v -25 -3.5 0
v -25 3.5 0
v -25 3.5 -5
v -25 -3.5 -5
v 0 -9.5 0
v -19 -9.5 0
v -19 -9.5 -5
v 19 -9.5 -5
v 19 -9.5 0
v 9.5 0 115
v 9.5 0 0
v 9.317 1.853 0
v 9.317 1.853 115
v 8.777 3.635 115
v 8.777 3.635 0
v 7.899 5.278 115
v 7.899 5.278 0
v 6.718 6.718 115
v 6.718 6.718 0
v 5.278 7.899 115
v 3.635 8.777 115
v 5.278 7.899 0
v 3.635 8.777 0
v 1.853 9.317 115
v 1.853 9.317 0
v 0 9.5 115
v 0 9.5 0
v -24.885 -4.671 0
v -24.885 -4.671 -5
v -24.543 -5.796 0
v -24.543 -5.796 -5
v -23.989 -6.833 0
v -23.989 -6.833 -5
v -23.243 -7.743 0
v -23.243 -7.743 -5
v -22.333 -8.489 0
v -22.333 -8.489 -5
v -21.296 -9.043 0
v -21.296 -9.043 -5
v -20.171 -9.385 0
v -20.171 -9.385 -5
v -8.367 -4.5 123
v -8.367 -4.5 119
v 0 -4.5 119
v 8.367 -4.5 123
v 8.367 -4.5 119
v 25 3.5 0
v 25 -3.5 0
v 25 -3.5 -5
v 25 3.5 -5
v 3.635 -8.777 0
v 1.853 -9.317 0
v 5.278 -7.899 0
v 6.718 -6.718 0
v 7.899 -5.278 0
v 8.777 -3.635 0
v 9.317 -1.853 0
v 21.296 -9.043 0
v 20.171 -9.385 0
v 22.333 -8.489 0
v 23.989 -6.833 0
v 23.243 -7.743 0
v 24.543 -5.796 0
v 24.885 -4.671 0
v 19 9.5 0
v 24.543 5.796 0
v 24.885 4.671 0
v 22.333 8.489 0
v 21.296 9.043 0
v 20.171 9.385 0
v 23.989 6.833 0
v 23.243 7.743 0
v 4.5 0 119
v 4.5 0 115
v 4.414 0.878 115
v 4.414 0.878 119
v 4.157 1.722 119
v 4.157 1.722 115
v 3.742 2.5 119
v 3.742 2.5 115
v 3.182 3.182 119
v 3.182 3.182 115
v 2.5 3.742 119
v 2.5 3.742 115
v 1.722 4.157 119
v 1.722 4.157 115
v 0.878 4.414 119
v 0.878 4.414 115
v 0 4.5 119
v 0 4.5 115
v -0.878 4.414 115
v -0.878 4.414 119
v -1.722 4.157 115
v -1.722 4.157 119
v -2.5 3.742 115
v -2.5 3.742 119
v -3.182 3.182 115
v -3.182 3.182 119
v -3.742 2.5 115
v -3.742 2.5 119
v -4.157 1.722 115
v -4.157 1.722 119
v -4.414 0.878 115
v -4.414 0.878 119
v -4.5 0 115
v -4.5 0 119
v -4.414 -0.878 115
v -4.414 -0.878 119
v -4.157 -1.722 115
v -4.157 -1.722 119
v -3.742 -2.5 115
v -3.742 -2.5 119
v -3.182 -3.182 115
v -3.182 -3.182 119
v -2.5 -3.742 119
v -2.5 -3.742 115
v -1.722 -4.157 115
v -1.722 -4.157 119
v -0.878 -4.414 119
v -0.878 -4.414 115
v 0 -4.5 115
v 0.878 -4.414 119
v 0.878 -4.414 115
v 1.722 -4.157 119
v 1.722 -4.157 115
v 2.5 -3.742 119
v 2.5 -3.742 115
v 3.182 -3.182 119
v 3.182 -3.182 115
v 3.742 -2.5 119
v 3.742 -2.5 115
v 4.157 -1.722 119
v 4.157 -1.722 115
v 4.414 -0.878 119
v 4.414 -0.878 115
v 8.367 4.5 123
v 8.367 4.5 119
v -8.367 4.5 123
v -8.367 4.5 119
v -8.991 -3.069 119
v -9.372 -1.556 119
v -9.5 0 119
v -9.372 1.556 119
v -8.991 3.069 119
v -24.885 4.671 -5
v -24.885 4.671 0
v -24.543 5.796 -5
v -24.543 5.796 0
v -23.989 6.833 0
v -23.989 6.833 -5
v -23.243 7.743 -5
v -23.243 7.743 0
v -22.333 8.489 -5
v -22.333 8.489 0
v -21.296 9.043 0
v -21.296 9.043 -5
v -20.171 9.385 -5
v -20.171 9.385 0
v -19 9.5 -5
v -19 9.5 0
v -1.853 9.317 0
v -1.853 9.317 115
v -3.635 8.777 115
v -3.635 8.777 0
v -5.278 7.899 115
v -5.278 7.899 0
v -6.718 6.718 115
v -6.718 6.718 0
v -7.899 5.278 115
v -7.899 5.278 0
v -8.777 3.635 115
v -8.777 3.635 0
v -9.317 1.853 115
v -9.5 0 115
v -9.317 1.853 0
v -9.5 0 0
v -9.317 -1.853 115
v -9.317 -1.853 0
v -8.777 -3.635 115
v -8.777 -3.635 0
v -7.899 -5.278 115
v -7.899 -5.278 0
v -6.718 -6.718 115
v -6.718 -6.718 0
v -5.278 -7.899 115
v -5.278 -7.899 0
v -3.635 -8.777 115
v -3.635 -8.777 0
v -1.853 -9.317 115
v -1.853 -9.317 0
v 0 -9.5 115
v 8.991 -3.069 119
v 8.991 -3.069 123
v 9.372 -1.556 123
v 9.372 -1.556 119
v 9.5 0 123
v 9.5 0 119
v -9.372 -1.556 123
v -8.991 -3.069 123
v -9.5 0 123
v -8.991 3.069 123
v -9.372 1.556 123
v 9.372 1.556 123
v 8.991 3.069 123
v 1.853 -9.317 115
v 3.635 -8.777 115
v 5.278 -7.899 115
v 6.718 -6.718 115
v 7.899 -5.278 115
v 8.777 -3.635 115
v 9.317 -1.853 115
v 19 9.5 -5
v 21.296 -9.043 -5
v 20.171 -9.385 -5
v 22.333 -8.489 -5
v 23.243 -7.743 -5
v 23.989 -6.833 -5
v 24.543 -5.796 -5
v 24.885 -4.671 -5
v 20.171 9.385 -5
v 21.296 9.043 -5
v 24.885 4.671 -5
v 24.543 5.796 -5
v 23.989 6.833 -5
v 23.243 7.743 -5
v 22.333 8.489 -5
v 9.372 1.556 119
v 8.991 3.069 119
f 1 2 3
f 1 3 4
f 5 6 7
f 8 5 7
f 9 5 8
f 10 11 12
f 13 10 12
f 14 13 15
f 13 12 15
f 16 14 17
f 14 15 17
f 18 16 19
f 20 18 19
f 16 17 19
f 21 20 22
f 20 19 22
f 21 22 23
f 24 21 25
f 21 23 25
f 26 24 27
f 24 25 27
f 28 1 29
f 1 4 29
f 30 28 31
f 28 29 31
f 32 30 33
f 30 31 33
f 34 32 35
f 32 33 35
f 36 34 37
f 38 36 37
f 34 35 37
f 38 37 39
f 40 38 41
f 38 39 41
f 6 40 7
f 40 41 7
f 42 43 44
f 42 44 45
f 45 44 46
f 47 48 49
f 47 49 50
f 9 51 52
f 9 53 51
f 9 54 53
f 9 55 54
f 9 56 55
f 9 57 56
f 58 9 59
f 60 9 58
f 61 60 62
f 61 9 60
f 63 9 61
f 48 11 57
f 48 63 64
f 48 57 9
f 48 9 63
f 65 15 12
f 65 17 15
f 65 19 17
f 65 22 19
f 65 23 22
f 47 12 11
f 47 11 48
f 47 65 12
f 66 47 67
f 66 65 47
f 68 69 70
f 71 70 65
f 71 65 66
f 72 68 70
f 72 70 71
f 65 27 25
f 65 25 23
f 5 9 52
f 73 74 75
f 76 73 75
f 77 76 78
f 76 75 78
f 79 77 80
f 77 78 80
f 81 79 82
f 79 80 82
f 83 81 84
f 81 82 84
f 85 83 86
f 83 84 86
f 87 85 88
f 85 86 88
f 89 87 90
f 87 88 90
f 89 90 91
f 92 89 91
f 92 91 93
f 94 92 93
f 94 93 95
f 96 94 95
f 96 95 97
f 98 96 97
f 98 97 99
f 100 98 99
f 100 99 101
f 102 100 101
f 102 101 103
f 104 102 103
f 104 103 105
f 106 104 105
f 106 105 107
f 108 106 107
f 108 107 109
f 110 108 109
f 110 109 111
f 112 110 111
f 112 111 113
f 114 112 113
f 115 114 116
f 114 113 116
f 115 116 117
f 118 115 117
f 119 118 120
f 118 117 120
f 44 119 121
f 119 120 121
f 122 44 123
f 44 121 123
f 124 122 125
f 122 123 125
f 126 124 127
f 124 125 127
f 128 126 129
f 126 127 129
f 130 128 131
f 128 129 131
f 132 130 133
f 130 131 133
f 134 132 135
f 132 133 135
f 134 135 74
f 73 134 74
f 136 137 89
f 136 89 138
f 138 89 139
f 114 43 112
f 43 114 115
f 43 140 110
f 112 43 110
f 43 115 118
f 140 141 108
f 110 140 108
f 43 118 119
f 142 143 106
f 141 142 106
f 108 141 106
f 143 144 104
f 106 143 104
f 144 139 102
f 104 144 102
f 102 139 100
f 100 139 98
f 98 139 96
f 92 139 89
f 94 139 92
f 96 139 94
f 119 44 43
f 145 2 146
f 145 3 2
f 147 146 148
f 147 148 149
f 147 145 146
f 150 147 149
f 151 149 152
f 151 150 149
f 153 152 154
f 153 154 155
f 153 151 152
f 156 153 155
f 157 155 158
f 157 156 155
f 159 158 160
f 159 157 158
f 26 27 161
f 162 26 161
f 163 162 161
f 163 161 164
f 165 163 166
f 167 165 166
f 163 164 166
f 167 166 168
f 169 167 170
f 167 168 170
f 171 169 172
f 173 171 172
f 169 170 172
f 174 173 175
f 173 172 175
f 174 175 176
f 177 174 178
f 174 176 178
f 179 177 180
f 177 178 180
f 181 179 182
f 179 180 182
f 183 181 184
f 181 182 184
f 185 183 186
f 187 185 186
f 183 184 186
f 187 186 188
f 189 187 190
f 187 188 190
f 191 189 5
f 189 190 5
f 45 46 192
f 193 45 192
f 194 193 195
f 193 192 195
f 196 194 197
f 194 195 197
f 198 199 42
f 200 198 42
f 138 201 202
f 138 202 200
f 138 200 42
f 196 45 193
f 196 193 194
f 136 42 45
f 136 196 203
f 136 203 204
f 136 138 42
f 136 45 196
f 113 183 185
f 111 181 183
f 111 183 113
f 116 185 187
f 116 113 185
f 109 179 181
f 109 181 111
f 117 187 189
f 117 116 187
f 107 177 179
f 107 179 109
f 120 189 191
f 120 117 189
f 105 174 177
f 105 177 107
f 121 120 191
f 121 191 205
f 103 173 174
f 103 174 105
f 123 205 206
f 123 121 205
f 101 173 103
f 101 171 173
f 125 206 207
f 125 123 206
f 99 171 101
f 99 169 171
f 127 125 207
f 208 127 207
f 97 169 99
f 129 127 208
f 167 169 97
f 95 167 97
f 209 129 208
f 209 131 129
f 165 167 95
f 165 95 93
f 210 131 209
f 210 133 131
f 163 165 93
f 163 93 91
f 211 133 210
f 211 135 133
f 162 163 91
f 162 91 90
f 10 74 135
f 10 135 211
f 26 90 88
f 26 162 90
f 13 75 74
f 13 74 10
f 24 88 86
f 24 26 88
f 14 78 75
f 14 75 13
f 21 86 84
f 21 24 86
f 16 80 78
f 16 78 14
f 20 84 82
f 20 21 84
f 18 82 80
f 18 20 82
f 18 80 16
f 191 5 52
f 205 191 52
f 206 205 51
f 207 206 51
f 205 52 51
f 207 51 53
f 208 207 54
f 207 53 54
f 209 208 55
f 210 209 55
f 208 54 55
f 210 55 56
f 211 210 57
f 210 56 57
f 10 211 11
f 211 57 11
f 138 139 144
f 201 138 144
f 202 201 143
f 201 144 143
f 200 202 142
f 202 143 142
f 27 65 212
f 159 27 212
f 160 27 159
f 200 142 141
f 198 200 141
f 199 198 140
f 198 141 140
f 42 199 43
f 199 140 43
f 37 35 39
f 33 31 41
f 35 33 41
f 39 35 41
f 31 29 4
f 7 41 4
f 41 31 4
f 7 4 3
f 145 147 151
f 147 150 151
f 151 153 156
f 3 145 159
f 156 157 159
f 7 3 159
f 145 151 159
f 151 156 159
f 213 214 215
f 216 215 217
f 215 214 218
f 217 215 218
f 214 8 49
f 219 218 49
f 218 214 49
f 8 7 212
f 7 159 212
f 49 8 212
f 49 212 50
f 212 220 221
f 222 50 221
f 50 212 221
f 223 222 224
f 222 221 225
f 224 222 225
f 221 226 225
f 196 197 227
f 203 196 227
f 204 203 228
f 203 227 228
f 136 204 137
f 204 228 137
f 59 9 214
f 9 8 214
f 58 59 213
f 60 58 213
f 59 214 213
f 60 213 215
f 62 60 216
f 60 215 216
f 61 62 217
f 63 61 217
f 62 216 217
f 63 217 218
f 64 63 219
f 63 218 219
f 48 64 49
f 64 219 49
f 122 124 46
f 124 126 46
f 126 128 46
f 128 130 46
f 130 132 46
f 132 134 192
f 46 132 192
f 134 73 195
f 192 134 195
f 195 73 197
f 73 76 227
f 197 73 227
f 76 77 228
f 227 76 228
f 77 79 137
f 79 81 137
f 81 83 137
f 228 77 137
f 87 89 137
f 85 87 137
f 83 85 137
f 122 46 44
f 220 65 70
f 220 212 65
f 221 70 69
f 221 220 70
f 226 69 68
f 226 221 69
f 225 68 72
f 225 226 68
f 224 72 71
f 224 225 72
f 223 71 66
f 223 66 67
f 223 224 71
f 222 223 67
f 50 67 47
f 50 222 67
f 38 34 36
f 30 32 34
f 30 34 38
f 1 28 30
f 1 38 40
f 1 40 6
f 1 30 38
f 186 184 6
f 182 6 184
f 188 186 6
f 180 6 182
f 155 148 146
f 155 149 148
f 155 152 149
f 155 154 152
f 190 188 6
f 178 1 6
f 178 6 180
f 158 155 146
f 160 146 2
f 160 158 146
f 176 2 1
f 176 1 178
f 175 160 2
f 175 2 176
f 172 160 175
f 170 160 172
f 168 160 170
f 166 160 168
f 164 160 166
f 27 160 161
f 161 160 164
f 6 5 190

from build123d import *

# Parameters (mm, degrees)
F1_DEPTH = 115
F2_DEPTH = 5
F3_R     = 6
F4_R     = 4.5
F5_DEPTH = 4
F7_DEPTH = 4


with BuildPart() as f1:
    # F0 (on Top) → F1 (new body)
    with BuildSketch(Plane.XY):
        with BuildLine():
            ThreePointArc((-4.21e-08, -9.5), (6.7175144064, -6.7175144362), (9.5, 0))
            ThreePointArc((9.5, 0), (6.7175144305, 6.7175144121), (2.6e-08, 9.5))
            ThreePointArc((2.6e-08, 9.5), (-9.5, 3.4e-08), (-4.21e-08, -9.5))
        make_face()
    extrude(amount=F1_DEPTH)

    # F0 (on Top) → F2 (join)
    with BuildSketch(Plane.XY):
        with BuildLine():
            ThreePointArc((-4.21e-08, -9.5), (-9.5, 3.4e-08), (2.6e-08, 9.5))
            Line((2.6e-08, 9.5), (-25, 9.5))
            Line((-25, 9.5), (-25, -9.5))
            Line((-25, -9.5), (-4.21e-08, -9.5))
        make_face()
        with BuildLine():
            ThreePointArc((2.6e-08, 9.5), (6.7175144305, 6.7175144121), (9.5, 0))
            ThreePointArc((9.5, 0), (6.7175144064, -6.7175144362), (-4.21e-08, -9.5))
            Line((-4.21e-08, -9.5), (25, -9.5))
            Line((25, -9.5), (25, 9.5))
            Line((25, 9.5), (2.6e-08, 9.5))
        make_face()
        with BuildLine():
            ThreePointArc((-4.21e-08, -9.5), (6.7175144064, -6.7175144362), (9.5, 0))
            ThreePointArc((9.5, 0), (6.7175144305, 6.7175144121), (2.6e-08, 9.5))
            ThreePointArc((2.6e-08, 9.5), (-9.5, 3.4e-08), (-4.21e-08, -9.5))
        make_face()
    extrude(amount=-F2_DEPTH)

    # F3
    f3_edges = [f1.edges().sort_by_distance(p)[0] for p in [
        (-25, 9.5, -2.5),
        (-25, -9.5, -2.5),
        (25, 9.5, -2.5),
        (25, -9.5, -2.5),
    ]]
    fillet(f3_edges, radius=F3_R)

    # F4 (on face) → F5 (join)
    with BuildSketch(Plane.XY.offset(115)):
        Circle(F4_R)
    extrude(amount=F5_DEPTH)

    # F6 (on face) → F7 (join)
    with BuildSketch(Plane.XY.offset(119)):
        with BuildLine():
            ThreePointArc((4.5, 0), (3.1819805153, 3.1819805153), (0, 4.5))
            ThreePointArc((0, 4.5), (-4.5, 0), (0, -4.5))
            ThreePointArc((0, -4.5), (3.1819805153, -3.1819805153), (4.5, 0))
        make_face()
        with BuildLine():
            Line((0, 4.5), (-8.3666002653, 4.5))
            ThreePointArc((-8.3666002653, 4.5), (-9.2122934854, 2.3202691093), (-9.5, 0))
            ThreePointArc((-9.5, 0), (-9.2122934854, -2.3202691093), (-8.3666002653, -4.5))
            Line((-8.3666002653, -4.5), (0, -4.5))
            ThreePointArc((0, -4.5), (-4.5, 0), (0, 4.5))
        make_face()
        with BuildLine():
            Line((8.3666002653, 4.5), (0, 4.5))
            ThreePointArc((0, 4.5), (3.1819805153, 3.1819805153), (4.5, 0))
            ThreePointArc((4.5, 0), (3.1819805153, -3.1819805153), (0, -4.5))
            Line((0, -4.5), (8.3666002653, -4.5))
            ThreePointArc((8.3666002653, -4.5), (9.2122934854, -2.3202691093), (9.5, 0))
            ThreePointArc((9.5, 0), (9.2122934854, 2.3202691093), (8.3666002653, 4.5))
        make_face()
    extrude(amount=F7_DEPTH)


solid = f1.part
